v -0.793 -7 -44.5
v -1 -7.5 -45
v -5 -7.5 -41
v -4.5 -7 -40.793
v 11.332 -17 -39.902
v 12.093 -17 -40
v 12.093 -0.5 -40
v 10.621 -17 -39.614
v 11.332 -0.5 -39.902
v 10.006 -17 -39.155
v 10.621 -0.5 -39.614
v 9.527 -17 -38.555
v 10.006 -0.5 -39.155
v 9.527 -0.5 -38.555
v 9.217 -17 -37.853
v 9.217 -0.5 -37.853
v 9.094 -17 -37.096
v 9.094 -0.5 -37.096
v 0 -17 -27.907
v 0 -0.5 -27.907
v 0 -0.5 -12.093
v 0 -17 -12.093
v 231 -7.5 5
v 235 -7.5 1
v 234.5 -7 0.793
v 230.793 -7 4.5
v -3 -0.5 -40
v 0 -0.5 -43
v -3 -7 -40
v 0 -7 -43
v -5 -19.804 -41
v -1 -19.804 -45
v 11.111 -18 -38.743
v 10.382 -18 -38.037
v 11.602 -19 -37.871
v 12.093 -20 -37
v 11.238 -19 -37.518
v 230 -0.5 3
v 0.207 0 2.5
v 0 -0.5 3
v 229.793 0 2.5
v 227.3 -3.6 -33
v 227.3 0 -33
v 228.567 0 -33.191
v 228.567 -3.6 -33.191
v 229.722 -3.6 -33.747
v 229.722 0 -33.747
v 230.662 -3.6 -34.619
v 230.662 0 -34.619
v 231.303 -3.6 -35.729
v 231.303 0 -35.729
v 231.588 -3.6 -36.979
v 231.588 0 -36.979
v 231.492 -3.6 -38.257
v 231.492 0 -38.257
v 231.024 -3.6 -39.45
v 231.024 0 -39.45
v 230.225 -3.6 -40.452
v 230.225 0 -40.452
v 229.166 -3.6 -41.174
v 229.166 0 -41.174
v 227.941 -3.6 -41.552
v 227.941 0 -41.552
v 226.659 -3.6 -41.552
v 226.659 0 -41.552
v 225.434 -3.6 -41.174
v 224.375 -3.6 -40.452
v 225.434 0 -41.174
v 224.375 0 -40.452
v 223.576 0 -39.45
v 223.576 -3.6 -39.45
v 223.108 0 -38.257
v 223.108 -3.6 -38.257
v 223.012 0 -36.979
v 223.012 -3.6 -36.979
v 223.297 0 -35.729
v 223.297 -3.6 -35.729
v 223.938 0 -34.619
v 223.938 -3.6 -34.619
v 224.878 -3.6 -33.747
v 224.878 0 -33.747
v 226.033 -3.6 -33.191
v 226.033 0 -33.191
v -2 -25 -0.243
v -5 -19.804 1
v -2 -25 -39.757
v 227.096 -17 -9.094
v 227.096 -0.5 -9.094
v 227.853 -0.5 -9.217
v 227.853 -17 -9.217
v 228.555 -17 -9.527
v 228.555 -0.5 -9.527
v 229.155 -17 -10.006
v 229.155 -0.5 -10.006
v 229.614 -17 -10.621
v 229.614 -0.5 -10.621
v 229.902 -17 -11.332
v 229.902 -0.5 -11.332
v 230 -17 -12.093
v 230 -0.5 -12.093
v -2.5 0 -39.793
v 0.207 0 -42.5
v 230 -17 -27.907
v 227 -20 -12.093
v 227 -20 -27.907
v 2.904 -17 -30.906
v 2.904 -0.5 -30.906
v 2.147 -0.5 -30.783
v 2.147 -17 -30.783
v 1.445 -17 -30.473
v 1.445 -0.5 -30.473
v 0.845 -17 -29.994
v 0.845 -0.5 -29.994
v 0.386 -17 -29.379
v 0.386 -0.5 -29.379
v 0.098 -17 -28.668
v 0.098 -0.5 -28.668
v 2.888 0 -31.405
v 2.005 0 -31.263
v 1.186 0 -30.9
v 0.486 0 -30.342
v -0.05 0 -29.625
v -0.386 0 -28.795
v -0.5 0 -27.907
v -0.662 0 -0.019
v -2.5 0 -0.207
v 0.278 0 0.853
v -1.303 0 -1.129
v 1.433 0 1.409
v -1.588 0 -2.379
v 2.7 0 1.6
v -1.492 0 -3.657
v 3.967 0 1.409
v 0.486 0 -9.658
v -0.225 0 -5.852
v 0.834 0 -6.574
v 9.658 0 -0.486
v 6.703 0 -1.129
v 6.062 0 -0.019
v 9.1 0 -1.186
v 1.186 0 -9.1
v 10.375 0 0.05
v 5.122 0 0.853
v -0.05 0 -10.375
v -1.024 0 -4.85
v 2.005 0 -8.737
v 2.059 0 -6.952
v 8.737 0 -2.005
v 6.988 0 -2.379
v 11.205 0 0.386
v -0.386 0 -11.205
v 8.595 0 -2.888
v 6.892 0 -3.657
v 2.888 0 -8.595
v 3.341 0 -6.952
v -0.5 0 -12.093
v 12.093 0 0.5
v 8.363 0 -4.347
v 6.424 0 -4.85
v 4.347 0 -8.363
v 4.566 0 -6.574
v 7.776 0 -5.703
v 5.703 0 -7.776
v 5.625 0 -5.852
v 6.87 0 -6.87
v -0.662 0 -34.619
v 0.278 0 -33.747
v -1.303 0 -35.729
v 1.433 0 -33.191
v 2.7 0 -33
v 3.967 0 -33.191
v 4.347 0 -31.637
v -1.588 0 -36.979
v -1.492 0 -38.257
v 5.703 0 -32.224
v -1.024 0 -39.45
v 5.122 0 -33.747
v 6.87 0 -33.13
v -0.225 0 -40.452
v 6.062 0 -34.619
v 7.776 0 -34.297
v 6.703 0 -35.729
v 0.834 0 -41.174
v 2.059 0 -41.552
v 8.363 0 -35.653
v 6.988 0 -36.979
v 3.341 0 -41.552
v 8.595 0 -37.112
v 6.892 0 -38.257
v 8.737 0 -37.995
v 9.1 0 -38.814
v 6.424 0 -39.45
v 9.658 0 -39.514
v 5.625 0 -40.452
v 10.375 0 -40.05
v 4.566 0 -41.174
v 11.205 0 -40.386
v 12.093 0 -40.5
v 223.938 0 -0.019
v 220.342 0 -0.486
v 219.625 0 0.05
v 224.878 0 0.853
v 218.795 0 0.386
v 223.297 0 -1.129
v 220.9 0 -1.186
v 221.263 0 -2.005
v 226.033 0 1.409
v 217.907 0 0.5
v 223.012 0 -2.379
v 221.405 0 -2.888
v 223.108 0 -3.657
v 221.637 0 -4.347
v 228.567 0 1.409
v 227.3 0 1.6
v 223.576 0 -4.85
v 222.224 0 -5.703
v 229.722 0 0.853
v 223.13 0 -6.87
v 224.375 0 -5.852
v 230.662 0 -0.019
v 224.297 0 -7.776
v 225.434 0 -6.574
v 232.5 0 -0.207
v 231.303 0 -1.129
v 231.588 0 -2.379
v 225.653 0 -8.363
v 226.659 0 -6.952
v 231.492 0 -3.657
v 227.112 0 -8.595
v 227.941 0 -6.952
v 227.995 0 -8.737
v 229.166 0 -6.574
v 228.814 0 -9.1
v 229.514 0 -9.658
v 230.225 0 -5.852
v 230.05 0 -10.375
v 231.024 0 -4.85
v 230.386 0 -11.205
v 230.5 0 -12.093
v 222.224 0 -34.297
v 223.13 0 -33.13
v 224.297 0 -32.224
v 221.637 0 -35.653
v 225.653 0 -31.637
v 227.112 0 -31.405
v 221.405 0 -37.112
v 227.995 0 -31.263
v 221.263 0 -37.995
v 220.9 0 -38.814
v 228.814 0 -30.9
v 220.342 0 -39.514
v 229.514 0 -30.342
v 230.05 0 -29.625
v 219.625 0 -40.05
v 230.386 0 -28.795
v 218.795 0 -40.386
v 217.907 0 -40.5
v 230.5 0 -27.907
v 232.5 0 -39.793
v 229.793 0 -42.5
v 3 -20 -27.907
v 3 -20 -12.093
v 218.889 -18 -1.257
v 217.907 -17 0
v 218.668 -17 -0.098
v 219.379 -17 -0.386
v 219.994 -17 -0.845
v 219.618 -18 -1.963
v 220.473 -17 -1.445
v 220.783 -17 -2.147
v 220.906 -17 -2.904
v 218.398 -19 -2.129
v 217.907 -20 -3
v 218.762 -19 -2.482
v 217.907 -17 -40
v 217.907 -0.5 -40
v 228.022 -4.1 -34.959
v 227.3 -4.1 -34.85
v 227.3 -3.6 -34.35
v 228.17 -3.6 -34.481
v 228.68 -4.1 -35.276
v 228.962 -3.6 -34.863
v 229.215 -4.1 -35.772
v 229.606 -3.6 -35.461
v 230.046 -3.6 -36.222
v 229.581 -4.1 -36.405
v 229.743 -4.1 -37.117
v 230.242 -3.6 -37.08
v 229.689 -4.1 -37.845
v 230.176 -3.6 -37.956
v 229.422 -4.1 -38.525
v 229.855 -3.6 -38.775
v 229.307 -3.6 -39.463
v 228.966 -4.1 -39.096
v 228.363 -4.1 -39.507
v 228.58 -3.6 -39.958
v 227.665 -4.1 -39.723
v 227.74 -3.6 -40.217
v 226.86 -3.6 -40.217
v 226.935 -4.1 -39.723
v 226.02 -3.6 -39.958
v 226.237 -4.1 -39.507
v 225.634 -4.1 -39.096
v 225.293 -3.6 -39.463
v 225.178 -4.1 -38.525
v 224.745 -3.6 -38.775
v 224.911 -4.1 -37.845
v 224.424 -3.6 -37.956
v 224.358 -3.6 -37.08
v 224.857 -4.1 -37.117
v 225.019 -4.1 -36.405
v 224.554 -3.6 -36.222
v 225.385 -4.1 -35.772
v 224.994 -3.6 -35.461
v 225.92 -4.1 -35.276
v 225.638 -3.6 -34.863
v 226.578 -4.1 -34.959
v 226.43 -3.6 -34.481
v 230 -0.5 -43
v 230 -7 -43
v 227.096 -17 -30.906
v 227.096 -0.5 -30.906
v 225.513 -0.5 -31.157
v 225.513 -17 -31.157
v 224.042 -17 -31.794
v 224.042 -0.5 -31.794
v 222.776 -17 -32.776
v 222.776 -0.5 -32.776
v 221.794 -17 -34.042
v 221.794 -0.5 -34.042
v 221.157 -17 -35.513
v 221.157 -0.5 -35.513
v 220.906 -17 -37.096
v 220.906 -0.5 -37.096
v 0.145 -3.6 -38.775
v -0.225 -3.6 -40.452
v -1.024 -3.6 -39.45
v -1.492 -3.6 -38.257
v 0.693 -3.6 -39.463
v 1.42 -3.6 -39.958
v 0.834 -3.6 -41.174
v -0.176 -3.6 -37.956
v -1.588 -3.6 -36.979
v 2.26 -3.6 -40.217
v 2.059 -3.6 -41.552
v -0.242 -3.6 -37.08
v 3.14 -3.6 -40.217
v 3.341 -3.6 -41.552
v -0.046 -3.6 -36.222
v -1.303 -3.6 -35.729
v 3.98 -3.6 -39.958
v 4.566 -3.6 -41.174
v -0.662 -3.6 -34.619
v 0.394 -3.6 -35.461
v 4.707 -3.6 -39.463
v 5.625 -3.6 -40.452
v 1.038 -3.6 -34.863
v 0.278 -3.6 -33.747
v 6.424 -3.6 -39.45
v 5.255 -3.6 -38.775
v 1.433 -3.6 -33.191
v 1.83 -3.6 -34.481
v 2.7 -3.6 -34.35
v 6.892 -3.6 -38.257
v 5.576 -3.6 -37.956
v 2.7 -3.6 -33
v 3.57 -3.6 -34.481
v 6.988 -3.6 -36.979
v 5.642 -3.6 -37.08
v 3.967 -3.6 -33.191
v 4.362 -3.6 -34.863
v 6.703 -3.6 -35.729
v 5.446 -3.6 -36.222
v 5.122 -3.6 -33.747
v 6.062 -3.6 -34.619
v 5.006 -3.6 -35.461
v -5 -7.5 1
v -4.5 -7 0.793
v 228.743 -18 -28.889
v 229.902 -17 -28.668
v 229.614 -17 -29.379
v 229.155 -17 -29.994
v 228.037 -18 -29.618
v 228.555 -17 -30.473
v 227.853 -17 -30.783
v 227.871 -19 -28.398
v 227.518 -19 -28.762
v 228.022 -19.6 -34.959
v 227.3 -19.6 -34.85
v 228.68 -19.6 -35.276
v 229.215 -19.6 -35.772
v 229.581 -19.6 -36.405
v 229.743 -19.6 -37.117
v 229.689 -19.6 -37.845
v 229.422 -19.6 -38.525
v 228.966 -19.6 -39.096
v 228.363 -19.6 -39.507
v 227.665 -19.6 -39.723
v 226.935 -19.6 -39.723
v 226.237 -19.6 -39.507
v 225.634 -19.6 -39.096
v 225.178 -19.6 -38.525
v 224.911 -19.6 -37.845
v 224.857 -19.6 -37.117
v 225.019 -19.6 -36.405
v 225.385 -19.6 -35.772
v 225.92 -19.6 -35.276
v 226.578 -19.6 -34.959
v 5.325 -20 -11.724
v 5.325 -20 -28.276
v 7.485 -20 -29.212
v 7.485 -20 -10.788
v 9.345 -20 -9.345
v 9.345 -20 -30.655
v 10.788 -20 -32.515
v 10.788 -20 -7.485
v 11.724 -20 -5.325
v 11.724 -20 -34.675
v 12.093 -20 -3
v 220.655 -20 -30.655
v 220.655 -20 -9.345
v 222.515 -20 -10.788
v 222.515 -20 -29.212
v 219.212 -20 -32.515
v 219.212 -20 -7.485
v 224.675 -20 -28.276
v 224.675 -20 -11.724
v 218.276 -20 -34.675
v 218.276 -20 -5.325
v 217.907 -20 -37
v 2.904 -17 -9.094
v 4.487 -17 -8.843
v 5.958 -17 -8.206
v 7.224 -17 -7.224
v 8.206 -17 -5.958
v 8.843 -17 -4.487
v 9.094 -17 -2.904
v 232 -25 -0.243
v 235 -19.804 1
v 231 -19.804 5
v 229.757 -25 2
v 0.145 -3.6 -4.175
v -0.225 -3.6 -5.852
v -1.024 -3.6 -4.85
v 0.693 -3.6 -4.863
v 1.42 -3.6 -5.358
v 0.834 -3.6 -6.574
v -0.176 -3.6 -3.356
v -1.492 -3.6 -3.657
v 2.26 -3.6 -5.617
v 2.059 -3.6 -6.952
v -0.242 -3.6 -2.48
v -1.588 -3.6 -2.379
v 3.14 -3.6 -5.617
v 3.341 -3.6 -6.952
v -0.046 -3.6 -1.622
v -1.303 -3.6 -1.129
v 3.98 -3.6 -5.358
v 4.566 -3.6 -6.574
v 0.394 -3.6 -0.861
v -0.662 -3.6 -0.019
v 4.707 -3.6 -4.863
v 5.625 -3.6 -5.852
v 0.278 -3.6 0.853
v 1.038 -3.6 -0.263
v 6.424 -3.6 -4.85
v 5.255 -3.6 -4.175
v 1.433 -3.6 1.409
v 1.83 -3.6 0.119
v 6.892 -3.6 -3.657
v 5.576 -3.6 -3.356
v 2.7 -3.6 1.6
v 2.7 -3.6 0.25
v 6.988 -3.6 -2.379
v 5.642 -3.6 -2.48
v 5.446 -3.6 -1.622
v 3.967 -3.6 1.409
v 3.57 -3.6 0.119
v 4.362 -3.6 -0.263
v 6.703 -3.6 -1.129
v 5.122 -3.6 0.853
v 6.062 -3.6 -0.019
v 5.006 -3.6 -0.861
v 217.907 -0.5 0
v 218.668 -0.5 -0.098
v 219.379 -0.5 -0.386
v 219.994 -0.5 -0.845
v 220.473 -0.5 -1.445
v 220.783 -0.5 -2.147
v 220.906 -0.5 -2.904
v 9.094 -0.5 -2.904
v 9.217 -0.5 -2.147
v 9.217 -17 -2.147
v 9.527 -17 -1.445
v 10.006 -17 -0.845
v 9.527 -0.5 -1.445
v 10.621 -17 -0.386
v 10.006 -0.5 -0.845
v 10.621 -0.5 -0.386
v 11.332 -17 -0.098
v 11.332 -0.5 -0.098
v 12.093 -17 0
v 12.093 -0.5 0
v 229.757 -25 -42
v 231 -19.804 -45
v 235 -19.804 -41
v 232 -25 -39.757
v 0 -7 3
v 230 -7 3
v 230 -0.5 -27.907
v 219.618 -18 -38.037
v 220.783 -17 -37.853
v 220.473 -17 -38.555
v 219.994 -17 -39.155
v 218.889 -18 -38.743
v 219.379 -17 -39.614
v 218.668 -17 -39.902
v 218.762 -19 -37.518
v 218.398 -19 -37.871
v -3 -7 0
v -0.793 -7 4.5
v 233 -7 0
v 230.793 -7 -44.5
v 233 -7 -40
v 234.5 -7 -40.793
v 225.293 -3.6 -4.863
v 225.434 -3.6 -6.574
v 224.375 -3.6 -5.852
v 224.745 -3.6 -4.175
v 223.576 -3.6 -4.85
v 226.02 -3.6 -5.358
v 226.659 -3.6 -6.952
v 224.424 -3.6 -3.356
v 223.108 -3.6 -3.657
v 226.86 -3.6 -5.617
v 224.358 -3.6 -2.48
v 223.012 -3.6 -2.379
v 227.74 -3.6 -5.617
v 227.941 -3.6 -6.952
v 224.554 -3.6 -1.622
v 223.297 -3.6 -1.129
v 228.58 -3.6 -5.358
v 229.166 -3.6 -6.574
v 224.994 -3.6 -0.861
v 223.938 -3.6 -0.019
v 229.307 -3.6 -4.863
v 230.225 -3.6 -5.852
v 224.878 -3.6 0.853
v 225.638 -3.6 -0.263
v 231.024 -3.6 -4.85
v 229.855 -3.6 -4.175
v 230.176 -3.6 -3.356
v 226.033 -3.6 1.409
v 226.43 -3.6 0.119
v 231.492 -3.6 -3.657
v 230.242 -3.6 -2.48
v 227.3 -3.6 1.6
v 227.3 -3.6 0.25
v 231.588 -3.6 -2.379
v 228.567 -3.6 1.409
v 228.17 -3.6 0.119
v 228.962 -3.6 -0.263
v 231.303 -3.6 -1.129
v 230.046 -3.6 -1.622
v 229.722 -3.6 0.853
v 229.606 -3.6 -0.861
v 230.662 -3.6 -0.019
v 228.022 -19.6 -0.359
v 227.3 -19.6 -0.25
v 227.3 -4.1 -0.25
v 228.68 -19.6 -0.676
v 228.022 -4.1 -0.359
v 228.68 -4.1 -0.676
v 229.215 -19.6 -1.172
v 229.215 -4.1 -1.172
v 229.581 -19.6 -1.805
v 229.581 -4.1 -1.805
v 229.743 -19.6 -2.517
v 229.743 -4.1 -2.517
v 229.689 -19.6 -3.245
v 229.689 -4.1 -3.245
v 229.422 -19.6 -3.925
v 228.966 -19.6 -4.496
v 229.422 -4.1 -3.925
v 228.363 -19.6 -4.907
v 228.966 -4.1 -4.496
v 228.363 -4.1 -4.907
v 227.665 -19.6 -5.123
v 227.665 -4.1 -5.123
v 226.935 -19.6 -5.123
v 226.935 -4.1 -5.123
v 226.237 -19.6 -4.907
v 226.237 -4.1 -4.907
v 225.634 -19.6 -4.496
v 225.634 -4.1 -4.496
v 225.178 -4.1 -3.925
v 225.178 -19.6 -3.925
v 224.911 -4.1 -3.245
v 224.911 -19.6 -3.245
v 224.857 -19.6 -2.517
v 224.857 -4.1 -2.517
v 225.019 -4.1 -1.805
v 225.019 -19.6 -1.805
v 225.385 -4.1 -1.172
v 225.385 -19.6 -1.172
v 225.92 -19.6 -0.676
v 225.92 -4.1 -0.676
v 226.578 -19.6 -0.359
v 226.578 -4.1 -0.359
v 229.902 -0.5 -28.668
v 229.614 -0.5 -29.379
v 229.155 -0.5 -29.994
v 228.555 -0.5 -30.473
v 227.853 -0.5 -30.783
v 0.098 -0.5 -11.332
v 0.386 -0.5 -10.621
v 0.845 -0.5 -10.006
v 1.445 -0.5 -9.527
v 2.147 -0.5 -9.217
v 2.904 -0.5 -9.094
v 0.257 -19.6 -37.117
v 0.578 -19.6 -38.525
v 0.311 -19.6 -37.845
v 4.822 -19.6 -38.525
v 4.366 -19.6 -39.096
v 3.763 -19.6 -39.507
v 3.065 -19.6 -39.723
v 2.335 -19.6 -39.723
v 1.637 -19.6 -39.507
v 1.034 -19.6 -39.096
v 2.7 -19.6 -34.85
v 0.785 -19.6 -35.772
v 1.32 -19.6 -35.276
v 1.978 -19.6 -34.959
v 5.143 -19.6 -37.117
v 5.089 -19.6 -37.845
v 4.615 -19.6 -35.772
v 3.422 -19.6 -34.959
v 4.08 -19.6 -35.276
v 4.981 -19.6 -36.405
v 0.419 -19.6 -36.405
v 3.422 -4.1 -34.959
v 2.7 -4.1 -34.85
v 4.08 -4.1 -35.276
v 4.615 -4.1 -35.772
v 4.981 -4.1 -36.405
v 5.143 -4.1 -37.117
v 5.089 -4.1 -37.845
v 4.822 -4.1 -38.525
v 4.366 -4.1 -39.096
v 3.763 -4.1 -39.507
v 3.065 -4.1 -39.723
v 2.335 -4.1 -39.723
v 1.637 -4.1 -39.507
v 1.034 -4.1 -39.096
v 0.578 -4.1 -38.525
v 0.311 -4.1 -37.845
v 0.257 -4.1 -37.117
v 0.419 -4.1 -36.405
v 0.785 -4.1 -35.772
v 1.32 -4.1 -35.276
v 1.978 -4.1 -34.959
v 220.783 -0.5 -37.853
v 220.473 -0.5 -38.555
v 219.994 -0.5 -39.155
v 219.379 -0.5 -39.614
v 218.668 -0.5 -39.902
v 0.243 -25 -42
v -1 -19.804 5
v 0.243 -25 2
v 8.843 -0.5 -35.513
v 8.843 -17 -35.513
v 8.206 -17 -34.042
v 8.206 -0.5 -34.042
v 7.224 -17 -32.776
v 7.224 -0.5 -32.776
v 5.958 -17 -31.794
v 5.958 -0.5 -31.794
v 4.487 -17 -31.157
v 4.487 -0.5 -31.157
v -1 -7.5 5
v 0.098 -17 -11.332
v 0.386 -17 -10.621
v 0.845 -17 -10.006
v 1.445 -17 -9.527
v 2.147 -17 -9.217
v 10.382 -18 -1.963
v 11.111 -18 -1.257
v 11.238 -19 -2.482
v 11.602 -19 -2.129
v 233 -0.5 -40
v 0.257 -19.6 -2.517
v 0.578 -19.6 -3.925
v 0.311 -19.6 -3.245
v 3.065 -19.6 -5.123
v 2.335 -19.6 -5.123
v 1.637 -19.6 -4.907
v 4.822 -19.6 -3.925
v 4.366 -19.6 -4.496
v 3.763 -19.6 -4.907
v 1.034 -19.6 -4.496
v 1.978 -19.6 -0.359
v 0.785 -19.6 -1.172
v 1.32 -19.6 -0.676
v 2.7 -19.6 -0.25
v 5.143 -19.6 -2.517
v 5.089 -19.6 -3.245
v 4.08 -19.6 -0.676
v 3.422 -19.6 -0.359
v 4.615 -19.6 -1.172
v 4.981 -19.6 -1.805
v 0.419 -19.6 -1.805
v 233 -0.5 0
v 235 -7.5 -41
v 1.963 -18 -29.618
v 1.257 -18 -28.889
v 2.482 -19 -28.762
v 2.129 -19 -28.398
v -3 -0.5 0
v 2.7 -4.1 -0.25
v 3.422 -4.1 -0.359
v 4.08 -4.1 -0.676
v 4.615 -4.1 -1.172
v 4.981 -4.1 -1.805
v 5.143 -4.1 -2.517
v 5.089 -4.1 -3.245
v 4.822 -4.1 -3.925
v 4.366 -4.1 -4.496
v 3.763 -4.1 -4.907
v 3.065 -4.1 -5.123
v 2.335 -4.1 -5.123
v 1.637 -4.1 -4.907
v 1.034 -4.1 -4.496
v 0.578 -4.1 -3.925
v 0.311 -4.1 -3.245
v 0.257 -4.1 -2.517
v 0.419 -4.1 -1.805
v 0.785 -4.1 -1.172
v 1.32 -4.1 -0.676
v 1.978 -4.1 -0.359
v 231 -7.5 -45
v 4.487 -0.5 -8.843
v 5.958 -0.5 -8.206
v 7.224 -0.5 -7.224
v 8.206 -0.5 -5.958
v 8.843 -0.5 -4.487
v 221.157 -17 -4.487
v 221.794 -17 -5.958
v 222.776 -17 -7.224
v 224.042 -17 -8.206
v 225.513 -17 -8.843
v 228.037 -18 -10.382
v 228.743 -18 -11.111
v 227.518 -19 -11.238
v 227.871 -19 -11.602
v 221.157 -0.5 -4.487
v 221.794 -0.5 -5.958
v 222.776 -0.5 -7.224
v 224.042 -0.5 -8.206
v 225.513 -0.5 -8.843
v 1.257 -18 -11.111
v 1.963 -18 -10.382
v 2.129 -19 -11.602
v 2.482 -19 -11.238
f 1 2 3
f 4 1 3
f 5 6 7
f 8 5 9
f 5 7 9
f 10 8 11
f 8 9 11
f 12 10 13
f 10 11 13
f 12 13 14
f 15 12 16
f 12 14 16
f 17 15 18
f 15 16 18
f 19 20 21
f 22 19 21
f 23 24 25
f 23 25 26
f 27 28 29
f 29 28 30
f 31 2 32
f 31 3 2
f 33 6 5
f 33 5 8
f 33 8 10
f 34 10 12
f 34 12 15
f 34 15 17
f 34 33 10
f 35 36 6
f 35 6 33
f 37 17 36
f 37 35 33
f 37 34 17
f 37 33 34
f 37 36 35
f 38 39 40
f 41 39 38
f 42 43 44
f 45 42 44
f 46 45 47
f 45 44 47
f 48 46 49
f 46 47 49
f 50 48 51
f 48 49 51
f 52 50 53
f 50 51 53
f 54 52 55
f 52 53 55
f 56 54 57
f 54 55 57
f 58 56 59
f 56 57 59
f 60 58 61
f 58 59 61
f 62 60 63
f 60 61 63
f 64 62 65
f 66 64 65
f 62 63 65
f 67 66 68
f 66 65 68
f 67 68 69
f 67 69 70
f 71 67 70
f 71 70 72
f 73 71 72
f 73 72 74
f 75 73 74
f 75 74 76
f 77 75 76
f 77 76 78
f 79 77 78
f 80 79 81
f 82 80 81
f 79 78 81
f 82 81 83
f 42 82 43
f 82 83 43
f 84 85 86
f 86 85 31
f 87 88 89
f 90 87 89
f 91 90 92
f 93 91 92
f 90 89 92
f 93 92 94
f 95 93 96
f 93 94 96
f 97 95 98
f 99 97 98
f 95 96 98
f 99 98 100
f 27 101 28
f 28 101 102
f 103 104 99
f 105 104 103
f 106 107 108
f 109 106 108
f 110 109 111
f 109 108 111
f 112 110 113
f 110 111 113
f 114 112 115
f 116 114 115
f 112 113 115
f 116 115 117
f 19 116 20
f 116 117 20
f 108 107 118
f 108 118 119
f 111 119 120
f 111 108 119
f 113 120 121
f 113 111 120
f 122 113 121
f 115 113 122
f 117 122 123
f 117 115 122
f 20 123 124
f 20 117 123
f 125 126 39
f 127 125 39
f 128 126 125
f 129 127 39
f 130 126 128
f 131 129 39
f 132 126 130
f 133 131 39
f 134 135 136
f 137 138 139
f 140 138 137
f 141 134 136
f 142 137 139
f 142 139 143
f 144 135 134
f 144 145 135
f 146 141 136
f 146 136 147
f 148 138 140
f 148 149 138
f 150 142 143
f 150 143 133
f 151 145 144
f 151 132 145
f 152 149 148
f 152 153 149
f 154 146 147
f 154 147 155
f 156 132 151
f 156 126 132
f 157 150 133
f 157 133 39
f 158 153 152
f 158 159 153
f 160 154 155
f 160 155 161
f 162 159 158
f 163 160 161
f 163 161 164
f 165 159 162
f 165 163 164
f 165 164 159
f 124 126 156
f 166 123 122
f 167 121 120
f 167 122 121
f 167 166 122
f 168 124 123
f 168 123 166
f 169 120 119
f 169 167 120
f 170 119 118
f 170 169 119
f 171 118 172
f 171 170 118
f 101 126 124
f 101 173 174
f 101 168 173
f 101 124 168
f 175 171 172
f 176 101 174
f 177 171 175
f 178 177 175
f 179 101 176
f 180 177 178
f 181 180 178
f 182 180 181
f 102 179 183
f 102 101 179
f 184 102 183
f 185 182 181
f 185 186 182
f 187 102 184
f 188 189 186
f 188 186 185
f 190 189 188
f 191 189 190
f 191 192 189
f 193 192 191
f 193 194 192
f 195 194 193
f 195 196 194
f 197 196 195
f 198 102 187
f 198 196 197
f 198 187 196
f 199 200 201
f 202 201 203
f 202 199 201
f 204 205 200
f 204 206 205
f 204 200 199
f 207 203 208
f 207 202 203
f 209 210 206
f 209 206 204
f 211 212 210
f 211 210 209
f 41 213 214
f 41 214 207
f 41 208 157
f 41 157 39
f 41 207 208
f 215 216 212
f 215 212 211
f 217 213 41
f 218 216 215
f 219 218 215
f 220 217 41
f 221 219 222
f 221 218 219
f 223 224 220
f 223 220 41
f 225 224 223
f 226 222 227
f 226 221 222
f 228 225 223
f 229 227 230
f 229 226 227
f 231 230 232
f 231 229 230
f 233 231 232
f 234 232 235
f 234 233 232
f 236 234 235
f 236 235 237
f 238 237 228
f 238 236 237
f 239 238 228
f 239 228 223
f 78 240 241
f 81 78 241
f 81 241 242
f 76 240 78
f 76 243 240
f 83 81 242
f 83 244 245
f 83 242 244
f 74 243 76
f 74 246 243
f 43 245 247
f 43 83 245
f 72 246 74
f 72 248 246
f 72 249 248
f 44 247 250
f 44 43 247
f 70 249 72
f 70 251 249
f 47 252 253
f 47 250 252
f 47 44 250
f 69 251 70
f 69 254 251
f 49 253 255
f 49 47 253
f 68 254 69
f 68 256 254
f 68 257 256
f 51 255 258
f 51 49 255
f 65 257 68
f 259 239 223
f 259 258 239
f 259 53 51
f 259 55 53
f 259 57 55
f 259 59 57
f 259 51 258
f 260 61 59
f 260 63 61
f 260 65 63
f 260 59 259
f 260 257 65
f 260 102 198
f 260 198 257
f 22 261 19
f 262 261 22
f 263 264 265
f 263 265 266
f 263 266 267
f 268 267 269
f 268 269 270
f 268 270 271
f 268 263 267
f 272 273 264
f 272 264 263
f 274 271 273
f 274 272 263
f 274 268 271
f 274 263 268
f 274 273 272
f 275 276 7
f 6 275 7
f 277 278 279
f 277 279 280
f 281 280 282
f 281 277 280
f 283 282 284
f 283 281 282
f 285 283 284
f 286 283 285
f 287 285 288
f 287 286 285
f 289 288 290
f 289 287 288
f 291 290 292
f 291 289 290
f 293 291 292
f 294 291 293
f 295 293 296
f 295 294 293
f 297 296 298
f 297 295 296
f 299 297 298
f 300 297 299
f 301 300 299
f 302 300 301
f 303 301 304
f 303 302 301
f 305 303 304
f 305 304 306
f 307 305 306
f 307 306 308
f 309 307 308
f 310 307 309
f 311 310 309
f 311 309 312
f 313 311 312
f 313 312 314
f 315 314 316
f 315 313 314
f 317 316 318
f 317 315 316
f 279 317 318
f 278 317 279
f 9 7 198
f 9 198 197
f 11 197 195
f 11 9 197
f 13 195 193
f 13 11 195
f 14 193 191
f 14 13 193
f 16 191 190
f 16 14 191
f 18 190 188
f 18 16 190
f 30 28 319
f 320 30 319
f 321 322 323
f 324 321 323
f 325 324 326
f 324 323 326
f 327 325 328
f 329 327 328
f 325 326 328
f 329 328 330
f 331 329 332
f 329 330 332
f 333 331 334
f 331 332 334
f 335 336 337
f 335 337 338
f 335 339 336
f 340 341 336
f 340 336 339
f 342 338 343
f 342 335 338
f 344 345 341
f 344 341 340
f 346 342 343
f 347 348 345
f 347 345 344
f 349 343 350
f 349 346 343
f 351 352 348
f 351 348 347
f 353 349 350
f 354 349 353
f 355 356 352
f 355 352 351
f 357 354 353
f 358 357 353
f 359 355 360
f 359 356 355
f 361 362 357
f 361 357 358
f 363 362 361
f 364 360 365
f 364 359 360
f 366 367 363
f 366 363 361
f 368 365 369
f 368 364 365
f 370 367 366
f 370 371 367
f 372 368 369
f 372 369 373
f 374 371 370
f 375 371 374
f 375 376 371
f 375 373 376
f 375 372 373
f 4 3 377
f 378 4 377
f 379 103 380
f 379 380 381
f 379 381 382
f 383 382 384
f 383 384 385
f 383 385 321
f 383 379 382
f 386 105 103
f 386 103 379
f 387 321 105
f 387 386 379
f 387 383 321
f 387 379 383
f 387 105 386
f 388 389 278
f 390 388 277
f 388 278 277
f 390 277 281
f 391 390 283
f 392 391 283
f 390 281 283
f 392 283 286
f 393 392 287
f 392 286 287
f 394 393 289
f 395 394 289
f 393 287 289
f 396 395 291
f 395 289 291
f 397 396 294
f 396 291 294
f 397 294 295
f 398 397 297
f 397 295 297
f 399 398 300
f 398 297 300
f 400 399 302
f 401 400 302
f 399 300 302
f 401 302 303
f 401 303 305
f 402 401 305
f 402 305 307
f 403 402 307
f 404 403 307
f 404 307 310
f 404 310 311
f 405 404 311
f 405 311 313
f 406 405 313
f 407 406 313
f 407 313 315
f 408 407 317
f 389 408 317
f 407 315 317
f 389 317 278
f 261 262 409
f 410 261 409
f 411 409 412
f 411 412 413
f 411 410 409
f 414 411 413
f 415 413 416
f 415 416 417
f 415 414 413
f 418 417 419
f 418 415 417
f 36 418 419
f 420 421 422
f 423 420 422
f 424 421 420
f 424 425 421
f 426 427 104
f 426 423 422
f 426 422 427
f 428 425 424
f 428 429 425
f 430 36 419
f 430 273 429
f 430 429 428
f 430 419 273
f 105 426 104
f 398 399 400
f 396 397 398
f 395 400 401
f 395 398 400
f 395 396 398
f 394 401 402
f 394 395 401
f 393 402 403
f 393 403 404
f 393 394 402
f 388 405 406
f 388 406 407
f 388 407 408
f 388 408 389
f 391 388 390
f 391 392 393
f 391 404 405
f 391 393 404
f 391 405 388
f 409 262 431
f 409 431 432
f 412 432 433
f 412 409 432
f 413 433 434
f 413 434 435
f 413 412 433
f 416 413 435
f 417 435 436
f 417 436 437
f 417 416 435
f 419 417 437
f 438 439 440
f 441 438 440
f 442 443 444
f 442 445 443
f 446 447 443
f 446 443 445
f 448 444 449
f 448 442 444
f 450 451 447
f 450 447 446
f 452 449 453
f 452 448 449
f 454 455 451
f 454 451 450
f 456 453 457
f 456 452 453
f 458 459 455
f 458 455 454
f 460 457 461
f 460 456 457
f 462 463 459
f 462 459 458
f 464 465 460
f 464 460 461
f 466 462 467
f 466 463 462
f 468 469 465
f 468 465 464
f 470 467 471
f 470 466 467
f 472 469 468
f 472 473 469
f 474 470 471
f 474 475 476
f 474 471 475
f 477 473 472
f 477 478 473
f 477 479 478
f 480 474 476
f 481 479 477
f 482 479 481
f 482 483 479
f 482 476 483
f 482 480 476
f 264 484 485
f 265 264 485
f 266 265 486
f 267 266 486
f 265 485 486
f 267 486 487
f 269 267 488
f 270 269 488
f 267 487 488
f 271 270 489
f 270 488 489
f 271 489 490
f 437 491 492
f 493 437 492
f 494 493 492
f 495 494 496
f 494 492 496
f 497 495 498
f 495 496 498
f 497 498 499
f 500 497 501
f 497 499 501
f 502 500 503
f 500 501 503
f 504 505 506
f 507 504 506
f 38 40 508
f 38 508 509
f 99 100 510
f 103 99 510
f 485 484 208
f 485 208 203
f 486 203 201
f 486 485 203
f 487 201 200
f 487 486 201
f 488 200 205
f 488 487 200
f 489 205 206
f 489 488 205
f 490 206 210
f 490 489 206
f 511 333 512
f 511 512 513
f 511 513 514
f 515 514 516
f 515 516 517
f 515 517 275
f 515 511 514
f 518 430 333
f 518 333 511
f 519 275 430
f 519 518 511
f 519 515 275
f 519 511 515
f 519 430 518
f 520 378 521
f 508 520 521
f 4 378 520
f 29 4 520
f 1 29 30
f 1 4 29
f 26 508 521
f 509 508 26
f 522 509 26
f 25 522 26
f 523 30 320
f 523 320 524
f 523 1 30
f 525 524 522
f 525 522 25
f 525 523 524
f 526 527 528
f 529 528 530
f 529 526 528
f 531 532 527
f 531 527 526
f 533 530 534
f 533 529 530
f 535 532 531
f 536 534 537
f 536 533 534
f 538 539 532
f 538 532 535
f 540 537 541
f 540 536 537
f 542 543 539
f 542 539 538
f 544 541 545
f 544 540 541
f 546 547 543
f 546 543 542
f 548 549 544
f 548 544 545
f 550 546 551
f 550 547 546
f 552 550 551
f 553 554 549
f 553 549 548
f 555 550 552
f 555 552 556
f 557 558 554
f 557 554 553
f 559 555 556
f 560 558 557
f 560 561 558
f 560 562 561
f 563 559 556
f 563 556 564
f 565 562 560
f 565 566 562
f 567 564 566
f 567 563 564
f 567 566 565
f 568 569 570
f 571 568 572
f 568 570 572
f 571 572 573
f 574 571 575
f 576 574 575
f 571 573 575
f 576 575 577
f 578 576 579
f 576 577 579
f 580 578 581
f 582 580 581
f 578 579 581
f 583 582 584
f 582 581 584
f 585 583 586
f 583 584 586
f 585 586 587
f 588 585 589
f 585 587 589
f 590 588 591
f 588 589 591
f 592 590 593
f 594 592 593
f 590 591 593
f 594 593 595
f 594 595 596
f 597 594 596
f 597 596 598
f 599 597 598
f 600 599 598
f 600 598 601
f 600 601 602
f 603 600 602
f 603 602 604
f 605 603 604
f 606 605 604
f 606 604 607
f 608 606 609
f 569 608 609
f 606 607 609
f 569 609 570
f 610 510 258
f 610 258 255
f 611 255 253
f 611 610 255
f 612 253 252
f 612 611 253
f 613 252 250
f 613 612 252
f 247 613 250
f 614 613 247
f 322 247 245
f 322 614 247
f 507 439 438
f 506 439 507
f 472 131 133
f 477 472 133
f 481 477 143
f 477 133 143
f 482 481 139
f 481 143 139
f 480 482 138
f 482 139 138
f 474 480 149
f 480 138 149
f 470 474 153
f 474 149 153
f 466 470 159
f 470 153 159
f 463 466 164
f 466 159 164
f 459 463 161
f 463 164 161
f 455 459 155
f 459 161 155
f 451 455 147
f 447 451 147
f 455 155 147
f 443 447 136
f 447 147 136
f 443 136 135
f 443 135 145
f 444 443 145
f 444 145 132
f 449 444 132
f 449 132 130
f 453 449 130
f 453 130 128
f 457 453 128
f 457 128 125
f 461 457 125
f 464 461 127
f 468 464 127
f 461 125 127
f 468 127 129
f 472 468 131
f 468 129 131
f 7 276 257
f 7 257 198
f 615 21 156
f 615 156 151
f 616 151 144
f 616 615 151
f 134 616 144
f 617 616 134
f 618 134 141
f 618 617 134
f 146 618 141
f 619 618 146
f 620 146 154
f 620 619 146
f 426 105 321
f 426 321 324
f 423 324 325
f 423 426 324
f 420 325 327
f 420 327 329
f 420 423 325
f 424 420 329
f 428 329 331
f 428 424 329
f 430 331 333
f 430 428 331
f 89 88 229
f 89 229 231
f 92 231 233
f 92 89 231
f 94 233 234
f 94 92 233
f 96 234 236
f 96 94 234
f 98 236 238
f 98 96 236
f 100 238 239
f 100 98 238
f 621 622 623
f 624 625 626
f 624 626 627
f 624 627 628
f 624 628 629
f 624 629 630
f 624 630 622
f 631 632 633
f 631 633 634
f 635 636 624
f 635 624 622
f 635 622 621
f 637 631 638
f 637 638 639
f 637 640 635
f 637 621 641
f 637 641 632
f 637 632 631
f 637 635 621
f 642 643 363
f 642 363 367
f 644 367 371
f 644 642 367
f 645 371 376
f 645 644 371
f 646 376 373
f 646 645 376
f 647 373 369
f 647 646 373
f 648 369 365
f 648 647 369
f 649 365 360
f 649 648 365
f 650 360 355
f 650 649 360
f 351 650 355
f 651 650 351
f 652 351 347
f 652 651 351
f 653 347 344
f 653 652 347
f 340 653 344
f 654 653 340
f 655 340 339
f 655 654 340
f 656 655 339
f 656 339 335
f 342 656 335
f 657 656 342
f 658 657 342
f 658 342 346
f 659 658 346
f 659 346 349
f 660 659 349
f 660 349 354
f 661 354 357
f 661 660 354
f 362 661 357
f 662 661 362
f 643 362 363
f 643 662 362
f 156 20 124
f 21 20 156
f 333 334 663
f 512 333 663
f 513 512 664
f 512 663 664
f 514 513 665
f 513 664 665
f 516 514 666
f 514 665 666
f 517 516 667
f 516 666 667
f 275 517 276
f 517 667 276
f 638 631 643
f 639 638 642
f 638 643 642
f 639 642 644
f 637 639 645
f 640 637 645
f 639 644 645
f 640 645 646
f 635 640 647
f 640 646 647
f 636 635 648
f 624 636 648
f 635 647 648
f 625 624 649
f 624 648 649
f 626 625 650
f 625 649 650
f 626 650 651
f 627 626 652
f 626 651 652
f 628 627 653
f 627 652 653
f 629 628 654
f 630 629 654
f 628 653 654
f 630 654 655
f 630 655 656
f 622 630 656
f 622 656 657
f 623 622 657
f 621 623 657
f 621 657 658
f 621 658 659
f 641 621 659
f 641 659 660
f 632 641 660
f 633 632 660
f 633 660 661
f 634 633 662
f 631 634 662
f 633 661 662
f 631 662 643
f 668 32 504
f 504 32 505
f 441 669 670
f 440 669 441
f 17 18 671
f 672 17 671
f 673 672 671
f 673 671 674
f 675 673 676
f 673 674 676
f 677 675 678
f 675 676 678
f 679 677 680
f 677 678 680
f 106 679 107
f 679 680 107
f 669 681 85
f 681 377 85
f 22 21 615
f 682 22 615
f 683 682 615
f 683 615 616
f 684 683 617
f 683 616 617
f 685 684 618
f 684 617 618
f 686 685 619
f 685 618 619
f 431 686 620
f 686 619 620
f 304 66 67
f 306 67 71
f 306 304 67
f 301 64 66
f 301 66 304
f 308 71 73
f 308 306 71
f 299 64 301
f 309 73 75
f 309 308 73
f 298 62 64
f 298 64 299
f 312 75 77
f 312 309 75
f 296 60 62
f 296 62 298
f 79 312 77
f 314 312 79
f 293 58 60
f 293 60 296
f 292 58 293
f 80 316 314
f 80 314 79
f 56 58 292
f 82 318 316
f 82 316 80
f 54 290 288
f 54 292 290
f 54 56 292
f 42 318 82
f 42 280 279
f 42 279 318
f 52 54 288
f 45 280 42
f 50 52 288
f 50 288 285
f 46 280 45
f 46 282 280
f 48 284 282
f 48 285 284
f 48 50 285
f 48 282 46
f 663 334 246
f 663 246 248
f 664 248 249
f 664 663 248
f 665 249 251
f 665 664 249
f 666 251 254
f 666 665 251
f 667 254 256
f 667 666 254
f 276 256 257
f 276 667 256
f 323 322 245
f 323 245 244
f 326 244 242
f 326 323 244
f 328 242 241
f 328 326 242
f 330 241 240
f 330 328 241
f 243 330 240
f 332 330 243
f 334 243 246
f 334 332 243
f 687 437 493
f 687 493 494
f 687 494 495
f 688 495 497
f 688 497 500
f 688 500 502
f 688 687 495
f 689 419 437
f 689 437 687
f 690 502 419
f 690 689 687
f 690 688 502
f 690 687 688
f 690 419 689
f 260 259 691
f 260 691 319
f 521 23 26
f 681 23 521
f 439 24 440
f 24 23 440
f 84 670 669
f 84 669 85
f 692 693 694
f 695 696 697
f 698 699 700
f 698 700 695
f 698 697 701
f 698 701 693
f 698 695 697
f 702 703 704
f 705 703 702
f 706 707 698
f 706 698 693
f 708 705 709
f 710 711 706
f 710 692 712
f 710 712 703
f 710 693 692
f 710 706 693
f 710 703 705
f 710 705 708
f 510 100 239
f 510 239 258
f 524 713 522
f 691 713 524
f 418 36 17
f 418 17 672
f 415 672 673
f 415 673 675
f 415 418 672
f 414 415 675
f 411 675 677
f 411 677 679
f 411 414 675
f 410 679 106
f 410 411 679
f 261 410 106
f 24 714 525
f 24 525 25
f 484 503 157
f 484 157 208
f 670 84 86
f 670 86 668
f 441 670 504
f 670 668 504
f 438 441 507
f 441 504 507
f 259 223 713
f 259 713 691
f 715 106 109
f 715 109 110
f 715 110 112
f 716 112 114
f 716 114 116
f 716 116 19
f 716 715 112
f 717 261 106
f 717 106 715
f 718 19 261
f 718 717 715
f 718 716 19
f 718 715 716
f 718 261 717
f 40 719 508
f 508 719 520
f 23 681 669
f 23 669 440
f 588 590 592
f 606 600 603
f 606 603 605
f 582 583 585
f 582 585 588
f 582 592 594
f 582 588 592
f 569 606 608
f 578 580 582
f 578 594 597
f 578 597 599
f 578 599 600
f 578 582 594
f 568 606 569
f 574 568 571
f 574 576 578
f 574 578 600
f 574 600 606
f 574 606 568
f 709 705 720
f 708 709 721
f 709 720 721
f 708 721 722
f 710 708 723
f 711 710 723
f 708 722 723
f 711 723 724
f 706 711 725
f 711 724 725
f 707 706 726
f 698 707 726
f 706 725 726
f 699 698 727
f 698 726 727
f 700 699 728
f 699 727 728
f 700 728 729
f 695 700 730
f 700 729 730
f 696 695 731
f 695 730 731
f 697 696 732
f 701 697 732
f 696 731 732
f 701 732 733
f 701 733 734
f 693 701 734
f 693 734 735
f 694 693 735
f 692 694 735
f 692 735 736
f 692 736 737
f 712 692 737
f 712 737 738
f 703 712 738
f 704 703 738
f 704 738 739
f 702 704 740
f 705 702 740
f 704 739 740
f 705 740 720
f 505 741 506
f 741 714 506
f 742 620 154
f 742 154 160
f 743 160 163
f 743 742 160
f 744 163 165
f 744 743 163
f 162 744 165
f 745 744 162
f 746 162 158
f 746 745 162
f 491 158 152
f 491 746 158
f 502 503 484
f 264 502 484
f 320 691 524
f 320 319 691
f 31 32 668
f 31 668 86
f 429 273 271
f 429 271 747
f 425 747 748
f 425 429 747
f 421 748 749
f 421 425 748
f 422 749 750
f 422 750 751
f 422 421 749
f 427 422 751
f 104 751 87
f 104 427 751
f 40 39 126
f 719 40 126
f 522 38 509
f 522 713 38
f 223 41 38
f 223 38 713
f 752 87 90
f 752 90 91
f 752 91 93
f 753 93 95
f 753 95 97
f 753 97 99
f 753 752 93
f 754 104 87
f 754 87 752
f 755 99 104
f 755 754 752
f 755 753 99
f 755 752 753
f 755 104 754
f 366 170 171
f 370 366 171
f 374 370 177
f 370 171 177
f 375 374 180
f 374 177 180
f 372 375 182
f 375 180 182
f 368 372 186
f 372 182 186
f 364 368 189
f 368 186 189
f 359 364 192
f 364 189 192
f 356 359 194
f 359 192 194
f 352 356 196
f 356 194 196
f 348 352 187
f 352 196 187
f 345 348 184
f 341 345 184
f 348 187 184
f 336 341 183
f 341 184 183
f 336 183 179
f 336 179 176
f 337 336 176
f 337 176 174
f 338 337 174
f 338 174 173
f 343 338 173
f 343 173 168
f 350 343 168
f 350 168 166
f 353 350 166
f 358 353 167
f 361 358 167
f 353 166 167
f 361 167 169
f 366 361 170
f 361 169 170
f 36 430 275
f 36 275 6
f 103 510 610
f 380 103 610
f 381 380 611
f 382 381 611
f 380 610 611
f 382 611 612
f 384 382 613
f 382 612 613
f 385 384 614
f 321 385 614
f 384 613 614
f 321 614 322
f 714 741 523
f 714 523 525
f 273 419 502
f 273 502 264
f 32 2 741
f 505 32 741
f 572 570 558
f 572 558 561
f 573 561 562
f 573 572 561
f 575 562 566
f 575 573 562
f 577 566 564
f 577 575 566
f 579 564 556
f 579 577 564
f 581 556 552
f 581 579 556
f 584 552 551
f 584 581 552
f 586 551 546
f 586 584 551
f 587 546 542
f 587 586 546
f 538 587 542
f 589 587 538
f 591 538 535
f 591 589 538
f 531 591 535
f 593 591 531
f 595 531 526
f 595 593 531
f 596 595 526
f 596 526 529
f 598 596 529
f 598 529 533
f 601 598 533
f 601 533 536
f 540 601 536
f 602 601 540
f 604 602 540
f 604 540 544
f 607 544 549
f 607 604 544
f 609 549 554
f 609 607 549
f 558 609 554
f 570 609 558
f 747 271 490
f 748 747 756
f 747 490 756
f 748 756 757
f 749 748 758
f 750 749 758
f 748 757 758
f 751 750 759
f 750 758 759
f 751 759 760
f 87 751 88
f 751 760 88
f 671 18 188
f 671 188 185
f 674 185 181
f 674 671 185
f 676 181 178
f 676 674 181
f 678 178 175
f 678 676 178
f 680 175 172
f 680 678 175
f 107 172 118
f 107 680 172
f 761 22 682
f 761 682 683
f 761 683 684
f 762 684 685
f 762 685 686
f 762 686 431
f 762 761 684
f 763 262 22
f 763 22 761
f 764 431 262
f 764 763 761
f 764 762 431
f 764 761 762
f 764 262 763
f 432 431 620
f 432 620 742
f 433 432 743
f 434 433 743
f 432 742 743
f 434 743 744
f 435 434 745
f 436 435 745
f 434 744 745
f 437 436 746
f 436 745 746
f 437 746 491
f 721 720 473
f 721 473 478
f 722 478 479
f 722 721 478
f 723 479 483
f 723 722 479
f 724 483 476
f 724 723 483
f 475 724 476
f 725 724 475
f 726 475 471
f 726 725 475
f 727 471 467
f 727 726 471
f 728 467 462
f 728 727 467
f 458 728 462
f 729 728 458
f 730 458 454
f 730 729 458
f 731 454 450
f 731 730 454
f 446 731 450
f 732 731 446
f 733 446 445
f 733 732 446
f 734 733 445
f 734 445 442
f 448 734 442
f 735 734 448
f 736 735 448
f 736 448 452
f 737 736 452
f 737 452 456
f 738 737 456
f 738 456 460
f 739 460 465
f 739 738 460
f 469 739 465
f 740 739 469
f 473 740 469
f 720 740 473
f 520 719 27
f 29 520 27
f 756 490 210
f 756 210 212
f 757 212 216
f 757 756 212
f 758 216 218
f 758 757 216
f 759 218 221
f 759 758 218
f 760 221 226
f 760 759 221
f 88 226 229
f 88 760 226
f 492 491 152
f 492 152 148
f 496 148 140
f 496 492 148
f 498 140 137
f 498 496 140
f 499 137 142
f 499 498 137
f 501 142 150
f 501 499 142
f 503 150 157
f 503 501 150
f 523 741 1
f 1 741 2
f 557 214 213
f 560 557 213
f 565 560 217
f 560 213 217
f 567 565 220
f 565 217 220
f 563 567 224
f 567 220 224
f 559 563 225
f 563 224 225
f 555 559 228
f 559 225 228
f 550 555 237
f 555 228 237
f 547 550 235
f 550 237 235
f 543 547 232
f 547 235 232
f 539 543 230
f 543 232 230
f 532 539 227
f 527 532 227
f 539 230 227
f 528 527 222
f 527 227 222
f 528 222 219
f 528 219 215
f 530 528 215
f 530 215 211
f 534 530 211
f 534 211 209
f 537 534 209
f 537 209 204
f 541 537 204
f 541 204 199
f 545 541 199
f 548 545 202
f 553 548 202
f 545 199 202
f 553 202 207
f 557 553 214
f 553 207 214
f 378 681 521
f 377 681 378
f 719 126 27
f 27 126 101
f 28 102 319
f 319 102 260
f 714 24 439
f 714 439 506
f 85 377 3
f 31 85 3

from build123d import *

# Parameters (mm, degrees)
SKETCH1_W             = 240
SKETCH1_H             = 50
BOSS_EXTRUDE1_DEPTH   = 25
SKETCH6_OUTSIDE_W     = 291.284
SKETCH6_OUTSIDE_H     = 101.284
SKETCH6_OUTSIDE_W_2   = 236
SKETCH6_OUTSIDE_H_2   = 46
CUT_EXTRUDE3_DEPTH    = 7
CHAMFER6_SIZE         = 3
CHAMFER5_SIZE         = 4
SKETCH6_9_OUTSIDE_W   = 291.284
SKETCH6_9_OUTSIDE_H   = 101.284
SKETCH6_9_OUTSIDE_W_2 = 236
SKETCH6_9_OUTSIDE_H_2 = 46
SKETCH6_9_OUTSIDE_R   = 4.3
CUT_EXTRUDE5_DEPTH    = 3.6
SKETCH16_R            = 2.45
CUT_EXTRUDE10_DEPTH   = 16
CHAMFER8_SIZE         = 0.5
CHAMFER9_SIZE         = 3
CHAMFER9_SIZE2        = 5.196152423
CHAMFER11_SIZE        = 0.5
CHAMFER12_SIZE        = 0.5
CUT_EXTRUDE11_DEPTH   = 20
CHAMFER13_SIZE        = 0.5
CHAMFER14_SIZE        = 3


with BuildPart() as part:
    # Sketch1 → Boss-Extrude1 (new body)
    with BuildSketch(Plane(origin=(0, 0, 0), x_dir=(1, 0, 0), z_dir=(0, 1, 0))):
        with Locations((115, 20)):
            Rectangle(SKETCH1_W, SKETCH1_H)
    extrude(amount=-BOSS_EXTRUDE1_DEPTH)

    # Sketch6 outside → Cut-Extrude3 (cut)
    with BuildSketch(Plane(origin=(0, 0, 0), x_dir=(1, 0, 0), z_dir=(0, 1, 0))):
        with Locations((115, 20)):
            Rectangle(SKETCH6_OUTSIDE_W, SKETCH6_OUTSIDE_H)
        with Locations((115, 20)):
            Rectangle(SKETCH6_OUTSIDE_W_2, SKETCH6_OUTSIDE_H_2, mode=Mode.SUBTRACT)
    extrude(amount=-CUT_EXTRUDE3_DEPTH, mode=Mode.SUBTRACT)

    # Chamfer6
    chamfer6_edges = [part.edges().sort_by_distance(p)[0] for p in [
        (-3, -3.5, -43),
        (233, -3.5, -43),
        (233, -3.5, 3),
        (-3, -3.5, 3),
    ]]
    chamfer(chamfer6_edges, length=CHAMFER6_SIZE)

    # Chamfer5
    chamfer5_edges = [part.edges().sort_by_distance(p)[0] for p in [
        (-5, -16, 5),
        (-5, -16, -45),
        (235, -16, -45),
        (235, -16, 5),
    ]]
    chamfer(chamfer5_edges, length=CHAMFER5_SIZE)

    # Sketch6<9> outside → Cut-Extrude5 (cut)
    # profile 1 of 5: a face of its own
    with BuildSketch(Plane(origin=(0, 0, 0), x_dir=(1, 0, 0), z_dir=(0, 1, 0))):
        with Locations((115, 20)):
            Rectangle(SKETCH6_9_OUTSIDE_W, SKETCH6_9_OUTSIDE_H)
        with Locations((115, 20)):
            Rectangle(SKETCH6_9_OUTSIDE_W_2, SKETCH6_9_OUTSIDE_H_2, mode=Mode.SUBTRACT)
    # profile 2 of 5: a face of its own
    with BuildSketch(Plane(origin=(0, 0, 0), x_dir=(1, 0, 0), z_dir=(0, 1, 0))):
        with Locations(Location((2.7, 37.3, 0), (0, 0, 270))):
            Circle(SKETCH6_9_OUTSIDE_R)
    # profile 3 of 5: a face of its own
    with BuildSketch(Plane(origin=(0, 0, 0), x_dir=(1, 0, 0), z_dir=(0, 1, 0))):
        with Locations(Location((227.3, 37.3, 0), (0, 0, 270))):
            Circle(SKETCH6_9_OUTSIDE_R)
    # profile 4 of 5: a face of its own
    with BuildSketch(Plane(origin=(0, 0, 0), x_dir=(1, 0, 0), z_dir=(0, 1, 0))):
        with Locations(Location((227.3, 2.7, 0), (0, 0, 270))):
            Circle(SKETCH6_9_OUTSIDE_R)
    # profile 5 of 5: a face of its own
    with BuildSketch(Plane(origin=(0, 0, 0), x_dir=(1, 0, 0), z_dir=(0, 1, 0))):
        with Locations(Location((2.7, 2.7, 0), (0, 0, 270))):
            Circle(SKETCH6_9_OUTSIDE_R)
    extrude(amount=-CUT_EXTRUDE5_DEPTH, mode=Mode.SUBTRACT)

    # Sketch16 → Cut-Extrude10 (cut)
    with BuildSketch(Plane(origin=(0, -3.6, 0), x_dir=(1, 0, 0), z_dir=(0, 1, 0))):
        with Locations(Location((2.7, 2.7, 0), (0, 0, 270))):
            Circle(SKETCH16_R)
        with Locations(Location((2.7, 37.3, 0), (0, 0, 270))):
            Circle(SKETCH16_R)
        with Locations(Location((227.3, 37.3, 0), (0, 0, 270))):
            Circle(SKETCH16_R)
        with Locations(Location((227.3, 2.7, 0), (0, 0, 270))):
            Circle(SKETCH16_R)
    extrude(amount=-CUT_EXTRUDE10_DEPTH, mode=Mode.SUBTRACT)

    # Chamfer8
    chamfer8_edges = [part.edges().sort_by_distance(p)[0] for p in [
        (227.3, -3.6, -5.15),
        (227.3, -3.6, -39.75),
        (2.7, -3.6, -39.75),
        (2.7, -3.6, -5.15),
    ]]
    chamfer(chamfer8_edges, length=CHAMFER8_SIZE)

    # Chamfer9
    chamfer9_edges = [part.edges().sort_by_distance(p)[0] for p in [
        (115, -25, -45),
        (-5, -25, -20),
        (115, -25, 5),
        (235, -25, -20),
        (233, -25, -43),
        (233, -25, 3),
        (-3, -25, 3),
        (-3, -25, -43),
    ]]
    chamfer9_side = [part.faces().sort_by_distance(p)[0] for p in [
        (115, -25, -20),
    ]]
    chamfer(chamfer9_edges, length=CHAMFER9_SIZE, length2=CHAMFER9_SIZE2, reference=chamfer9_side[0])

    # Chamfer11
    chamfer11_edges = [part.edges().sort_by_distance(p)[0] for p in [
        (115, 0, 3),
        (-3, 0, -20),
        (233, 0, -20),
        (115, 0, -43),
        (-1.5, 0, 1.5),
        (-1.5, 0, -41.5),
        (231.5, 0, -41.5),
        (231.5, 0, 1.5),
    ]]
    chamfer(chamfer11_edges, length=CHAMFER11_SIZE)

    # Chamfer12
    chamfer12_edges = [part.edges().sort_by_distance(p)[0] for p in [
        (115, -7, -45),
        (115, -7, 5),
        (235, -7, -20),
        (-5, -7, -20),
        (233, -7, -43),
        (233, -7, 3),
        (-3, -7, 3),
        (-3, -7, -43),
    ]]
    chamfer(chamfer12_edges, length=CHAMFER12_SIZE)

    # Sketch18 → Cut-Extrude11 (cut)
    with BuildSketch(Plane(origin=(0, 0, 0), x_dir=(1, 0, 0), z_dir=(0, 1, 0))):
        with BuildLine():
            Line((230, 12.092866172), (230, 27.907133828))
            ThreePointArc((230, 27.907133828), (229.154913652, 29.994320249), (227.095768564, 30.905604835))
            ThreePointArc((227.095768564, 30.905604835), (222.776174185, 32.776174185), (220.905604835, 37.095768564))
            ThreePointArc((220.905604835, 37.095768564), (219.994320249, 39.154913652), (217.907133828, 40))
            Line((217.907133828, 40), (12.092866172, 40))
            ThreePointArc((12.092866172, 40), (10.005679751, 39.154913652), (9.094395165, 37.095768564))
            ThreePointArc((9.094395165, 37.095768564), (7.223825815, 32.776174185), (2.904231436, 30.905604835))
            ThreePointArc((2.904231436, 30.905604835), (0.845086348, 29.994320249), (0, 27.907133828))
            Line((0, 27.907133828), (0, 12.092866172))
            ThreePointArc((0, 12.092866172), (0.845086348, 10.005679751), (2.904231436, 9.094395165))
            ThreePointArc((2.904231436, 9.094395165), (7.223825815, 7.223825815), (9.094395165, 2.904231436))
            ThreePointArc((9.094395165, 2.904231436), (10.005679751, 0.845086348), (12.092866172, 0))
            Line((12.092866172, 0), (217.907133828, 0))
            ThreePointArc((217.907133828, 0), (219.994320249, 0.845086348), (220.905604835, 2.904231436))
            ThreePointArc((220.905604835, 2.904231436), (222.776174185, 7.223825815), (227.095768564, 9.094395165))
            ThreePointArc((227.095768564, 9.094395165), (229.154913652, 10.005679751), (230, 12.092866172))
        make_face()
    extrude(amount=-CUT_EXTRUDE11_DEPTH, mode=Mode.SUBTRACT)

    # Chamfer13
    chamfer13_edges = [part.edges().sort_by_distance(p)[0] for p in [
        (229.154913652, 0, -29.994320249),
        (222.776174185, 0, -32.776174185),
        (219.994320249, 0, -39.154913652),
        (115, 0, -40),
        (10.005679751, 0, -39.154913652),
        (7.223825815, 0, -32.776174185),
        (0.845086348, 0, -29.994320249),
        (0, 0, -20),
        (0.845086348, 0, -10.005679751),
        (7.223825815, 0, -7.223825815),
        (10.005679751, 0, -0.845086348),
        (115, 0, 0),
        (219.994320249, 0, -0.845086348),
        (222.776174185, 0, -7.223825815),
        (229.154913652, 0, -10.005679751),
        (230, 0, -20),
    ]]
    chamfer(chamfer13_edges, length=CHAMFER13_SIZE)

    # Chamfer14
    chamfer14_edges = [part.edges().sort_by_distance(p)[0] for p in [
        (222.776174185, -20, -32.776174185),
        (219.994320249, -20, -39.154913652),
        (115, -20, -40),
        (10.005679751, -20, -39.154913652),
        (7.223825815, -20, -32.776174185),
        (0.845086348, -20, -29.994320249),
        (0, -20, -20),
        (0.845086348, -20, -10.005679751),
        (7.223825815, -20, -7.223825815),
        (10.005679751, -20, -0.845086348),
        (115, -20, 0),
        (219.994320249, -20, -0.845086348),
        (222.776174185, -20, -7.223825815),
        (229.154913652, -20, -10.005679751),
        (230, -20, -20),
        (229.154913652, -20, -29.994320249),
    ]]
    chamfer(chamfer14_edges, length=CHAMFER14_SIZE - 0.0001)  # a hair under: the kernel refuses the full size


solid = part.part
